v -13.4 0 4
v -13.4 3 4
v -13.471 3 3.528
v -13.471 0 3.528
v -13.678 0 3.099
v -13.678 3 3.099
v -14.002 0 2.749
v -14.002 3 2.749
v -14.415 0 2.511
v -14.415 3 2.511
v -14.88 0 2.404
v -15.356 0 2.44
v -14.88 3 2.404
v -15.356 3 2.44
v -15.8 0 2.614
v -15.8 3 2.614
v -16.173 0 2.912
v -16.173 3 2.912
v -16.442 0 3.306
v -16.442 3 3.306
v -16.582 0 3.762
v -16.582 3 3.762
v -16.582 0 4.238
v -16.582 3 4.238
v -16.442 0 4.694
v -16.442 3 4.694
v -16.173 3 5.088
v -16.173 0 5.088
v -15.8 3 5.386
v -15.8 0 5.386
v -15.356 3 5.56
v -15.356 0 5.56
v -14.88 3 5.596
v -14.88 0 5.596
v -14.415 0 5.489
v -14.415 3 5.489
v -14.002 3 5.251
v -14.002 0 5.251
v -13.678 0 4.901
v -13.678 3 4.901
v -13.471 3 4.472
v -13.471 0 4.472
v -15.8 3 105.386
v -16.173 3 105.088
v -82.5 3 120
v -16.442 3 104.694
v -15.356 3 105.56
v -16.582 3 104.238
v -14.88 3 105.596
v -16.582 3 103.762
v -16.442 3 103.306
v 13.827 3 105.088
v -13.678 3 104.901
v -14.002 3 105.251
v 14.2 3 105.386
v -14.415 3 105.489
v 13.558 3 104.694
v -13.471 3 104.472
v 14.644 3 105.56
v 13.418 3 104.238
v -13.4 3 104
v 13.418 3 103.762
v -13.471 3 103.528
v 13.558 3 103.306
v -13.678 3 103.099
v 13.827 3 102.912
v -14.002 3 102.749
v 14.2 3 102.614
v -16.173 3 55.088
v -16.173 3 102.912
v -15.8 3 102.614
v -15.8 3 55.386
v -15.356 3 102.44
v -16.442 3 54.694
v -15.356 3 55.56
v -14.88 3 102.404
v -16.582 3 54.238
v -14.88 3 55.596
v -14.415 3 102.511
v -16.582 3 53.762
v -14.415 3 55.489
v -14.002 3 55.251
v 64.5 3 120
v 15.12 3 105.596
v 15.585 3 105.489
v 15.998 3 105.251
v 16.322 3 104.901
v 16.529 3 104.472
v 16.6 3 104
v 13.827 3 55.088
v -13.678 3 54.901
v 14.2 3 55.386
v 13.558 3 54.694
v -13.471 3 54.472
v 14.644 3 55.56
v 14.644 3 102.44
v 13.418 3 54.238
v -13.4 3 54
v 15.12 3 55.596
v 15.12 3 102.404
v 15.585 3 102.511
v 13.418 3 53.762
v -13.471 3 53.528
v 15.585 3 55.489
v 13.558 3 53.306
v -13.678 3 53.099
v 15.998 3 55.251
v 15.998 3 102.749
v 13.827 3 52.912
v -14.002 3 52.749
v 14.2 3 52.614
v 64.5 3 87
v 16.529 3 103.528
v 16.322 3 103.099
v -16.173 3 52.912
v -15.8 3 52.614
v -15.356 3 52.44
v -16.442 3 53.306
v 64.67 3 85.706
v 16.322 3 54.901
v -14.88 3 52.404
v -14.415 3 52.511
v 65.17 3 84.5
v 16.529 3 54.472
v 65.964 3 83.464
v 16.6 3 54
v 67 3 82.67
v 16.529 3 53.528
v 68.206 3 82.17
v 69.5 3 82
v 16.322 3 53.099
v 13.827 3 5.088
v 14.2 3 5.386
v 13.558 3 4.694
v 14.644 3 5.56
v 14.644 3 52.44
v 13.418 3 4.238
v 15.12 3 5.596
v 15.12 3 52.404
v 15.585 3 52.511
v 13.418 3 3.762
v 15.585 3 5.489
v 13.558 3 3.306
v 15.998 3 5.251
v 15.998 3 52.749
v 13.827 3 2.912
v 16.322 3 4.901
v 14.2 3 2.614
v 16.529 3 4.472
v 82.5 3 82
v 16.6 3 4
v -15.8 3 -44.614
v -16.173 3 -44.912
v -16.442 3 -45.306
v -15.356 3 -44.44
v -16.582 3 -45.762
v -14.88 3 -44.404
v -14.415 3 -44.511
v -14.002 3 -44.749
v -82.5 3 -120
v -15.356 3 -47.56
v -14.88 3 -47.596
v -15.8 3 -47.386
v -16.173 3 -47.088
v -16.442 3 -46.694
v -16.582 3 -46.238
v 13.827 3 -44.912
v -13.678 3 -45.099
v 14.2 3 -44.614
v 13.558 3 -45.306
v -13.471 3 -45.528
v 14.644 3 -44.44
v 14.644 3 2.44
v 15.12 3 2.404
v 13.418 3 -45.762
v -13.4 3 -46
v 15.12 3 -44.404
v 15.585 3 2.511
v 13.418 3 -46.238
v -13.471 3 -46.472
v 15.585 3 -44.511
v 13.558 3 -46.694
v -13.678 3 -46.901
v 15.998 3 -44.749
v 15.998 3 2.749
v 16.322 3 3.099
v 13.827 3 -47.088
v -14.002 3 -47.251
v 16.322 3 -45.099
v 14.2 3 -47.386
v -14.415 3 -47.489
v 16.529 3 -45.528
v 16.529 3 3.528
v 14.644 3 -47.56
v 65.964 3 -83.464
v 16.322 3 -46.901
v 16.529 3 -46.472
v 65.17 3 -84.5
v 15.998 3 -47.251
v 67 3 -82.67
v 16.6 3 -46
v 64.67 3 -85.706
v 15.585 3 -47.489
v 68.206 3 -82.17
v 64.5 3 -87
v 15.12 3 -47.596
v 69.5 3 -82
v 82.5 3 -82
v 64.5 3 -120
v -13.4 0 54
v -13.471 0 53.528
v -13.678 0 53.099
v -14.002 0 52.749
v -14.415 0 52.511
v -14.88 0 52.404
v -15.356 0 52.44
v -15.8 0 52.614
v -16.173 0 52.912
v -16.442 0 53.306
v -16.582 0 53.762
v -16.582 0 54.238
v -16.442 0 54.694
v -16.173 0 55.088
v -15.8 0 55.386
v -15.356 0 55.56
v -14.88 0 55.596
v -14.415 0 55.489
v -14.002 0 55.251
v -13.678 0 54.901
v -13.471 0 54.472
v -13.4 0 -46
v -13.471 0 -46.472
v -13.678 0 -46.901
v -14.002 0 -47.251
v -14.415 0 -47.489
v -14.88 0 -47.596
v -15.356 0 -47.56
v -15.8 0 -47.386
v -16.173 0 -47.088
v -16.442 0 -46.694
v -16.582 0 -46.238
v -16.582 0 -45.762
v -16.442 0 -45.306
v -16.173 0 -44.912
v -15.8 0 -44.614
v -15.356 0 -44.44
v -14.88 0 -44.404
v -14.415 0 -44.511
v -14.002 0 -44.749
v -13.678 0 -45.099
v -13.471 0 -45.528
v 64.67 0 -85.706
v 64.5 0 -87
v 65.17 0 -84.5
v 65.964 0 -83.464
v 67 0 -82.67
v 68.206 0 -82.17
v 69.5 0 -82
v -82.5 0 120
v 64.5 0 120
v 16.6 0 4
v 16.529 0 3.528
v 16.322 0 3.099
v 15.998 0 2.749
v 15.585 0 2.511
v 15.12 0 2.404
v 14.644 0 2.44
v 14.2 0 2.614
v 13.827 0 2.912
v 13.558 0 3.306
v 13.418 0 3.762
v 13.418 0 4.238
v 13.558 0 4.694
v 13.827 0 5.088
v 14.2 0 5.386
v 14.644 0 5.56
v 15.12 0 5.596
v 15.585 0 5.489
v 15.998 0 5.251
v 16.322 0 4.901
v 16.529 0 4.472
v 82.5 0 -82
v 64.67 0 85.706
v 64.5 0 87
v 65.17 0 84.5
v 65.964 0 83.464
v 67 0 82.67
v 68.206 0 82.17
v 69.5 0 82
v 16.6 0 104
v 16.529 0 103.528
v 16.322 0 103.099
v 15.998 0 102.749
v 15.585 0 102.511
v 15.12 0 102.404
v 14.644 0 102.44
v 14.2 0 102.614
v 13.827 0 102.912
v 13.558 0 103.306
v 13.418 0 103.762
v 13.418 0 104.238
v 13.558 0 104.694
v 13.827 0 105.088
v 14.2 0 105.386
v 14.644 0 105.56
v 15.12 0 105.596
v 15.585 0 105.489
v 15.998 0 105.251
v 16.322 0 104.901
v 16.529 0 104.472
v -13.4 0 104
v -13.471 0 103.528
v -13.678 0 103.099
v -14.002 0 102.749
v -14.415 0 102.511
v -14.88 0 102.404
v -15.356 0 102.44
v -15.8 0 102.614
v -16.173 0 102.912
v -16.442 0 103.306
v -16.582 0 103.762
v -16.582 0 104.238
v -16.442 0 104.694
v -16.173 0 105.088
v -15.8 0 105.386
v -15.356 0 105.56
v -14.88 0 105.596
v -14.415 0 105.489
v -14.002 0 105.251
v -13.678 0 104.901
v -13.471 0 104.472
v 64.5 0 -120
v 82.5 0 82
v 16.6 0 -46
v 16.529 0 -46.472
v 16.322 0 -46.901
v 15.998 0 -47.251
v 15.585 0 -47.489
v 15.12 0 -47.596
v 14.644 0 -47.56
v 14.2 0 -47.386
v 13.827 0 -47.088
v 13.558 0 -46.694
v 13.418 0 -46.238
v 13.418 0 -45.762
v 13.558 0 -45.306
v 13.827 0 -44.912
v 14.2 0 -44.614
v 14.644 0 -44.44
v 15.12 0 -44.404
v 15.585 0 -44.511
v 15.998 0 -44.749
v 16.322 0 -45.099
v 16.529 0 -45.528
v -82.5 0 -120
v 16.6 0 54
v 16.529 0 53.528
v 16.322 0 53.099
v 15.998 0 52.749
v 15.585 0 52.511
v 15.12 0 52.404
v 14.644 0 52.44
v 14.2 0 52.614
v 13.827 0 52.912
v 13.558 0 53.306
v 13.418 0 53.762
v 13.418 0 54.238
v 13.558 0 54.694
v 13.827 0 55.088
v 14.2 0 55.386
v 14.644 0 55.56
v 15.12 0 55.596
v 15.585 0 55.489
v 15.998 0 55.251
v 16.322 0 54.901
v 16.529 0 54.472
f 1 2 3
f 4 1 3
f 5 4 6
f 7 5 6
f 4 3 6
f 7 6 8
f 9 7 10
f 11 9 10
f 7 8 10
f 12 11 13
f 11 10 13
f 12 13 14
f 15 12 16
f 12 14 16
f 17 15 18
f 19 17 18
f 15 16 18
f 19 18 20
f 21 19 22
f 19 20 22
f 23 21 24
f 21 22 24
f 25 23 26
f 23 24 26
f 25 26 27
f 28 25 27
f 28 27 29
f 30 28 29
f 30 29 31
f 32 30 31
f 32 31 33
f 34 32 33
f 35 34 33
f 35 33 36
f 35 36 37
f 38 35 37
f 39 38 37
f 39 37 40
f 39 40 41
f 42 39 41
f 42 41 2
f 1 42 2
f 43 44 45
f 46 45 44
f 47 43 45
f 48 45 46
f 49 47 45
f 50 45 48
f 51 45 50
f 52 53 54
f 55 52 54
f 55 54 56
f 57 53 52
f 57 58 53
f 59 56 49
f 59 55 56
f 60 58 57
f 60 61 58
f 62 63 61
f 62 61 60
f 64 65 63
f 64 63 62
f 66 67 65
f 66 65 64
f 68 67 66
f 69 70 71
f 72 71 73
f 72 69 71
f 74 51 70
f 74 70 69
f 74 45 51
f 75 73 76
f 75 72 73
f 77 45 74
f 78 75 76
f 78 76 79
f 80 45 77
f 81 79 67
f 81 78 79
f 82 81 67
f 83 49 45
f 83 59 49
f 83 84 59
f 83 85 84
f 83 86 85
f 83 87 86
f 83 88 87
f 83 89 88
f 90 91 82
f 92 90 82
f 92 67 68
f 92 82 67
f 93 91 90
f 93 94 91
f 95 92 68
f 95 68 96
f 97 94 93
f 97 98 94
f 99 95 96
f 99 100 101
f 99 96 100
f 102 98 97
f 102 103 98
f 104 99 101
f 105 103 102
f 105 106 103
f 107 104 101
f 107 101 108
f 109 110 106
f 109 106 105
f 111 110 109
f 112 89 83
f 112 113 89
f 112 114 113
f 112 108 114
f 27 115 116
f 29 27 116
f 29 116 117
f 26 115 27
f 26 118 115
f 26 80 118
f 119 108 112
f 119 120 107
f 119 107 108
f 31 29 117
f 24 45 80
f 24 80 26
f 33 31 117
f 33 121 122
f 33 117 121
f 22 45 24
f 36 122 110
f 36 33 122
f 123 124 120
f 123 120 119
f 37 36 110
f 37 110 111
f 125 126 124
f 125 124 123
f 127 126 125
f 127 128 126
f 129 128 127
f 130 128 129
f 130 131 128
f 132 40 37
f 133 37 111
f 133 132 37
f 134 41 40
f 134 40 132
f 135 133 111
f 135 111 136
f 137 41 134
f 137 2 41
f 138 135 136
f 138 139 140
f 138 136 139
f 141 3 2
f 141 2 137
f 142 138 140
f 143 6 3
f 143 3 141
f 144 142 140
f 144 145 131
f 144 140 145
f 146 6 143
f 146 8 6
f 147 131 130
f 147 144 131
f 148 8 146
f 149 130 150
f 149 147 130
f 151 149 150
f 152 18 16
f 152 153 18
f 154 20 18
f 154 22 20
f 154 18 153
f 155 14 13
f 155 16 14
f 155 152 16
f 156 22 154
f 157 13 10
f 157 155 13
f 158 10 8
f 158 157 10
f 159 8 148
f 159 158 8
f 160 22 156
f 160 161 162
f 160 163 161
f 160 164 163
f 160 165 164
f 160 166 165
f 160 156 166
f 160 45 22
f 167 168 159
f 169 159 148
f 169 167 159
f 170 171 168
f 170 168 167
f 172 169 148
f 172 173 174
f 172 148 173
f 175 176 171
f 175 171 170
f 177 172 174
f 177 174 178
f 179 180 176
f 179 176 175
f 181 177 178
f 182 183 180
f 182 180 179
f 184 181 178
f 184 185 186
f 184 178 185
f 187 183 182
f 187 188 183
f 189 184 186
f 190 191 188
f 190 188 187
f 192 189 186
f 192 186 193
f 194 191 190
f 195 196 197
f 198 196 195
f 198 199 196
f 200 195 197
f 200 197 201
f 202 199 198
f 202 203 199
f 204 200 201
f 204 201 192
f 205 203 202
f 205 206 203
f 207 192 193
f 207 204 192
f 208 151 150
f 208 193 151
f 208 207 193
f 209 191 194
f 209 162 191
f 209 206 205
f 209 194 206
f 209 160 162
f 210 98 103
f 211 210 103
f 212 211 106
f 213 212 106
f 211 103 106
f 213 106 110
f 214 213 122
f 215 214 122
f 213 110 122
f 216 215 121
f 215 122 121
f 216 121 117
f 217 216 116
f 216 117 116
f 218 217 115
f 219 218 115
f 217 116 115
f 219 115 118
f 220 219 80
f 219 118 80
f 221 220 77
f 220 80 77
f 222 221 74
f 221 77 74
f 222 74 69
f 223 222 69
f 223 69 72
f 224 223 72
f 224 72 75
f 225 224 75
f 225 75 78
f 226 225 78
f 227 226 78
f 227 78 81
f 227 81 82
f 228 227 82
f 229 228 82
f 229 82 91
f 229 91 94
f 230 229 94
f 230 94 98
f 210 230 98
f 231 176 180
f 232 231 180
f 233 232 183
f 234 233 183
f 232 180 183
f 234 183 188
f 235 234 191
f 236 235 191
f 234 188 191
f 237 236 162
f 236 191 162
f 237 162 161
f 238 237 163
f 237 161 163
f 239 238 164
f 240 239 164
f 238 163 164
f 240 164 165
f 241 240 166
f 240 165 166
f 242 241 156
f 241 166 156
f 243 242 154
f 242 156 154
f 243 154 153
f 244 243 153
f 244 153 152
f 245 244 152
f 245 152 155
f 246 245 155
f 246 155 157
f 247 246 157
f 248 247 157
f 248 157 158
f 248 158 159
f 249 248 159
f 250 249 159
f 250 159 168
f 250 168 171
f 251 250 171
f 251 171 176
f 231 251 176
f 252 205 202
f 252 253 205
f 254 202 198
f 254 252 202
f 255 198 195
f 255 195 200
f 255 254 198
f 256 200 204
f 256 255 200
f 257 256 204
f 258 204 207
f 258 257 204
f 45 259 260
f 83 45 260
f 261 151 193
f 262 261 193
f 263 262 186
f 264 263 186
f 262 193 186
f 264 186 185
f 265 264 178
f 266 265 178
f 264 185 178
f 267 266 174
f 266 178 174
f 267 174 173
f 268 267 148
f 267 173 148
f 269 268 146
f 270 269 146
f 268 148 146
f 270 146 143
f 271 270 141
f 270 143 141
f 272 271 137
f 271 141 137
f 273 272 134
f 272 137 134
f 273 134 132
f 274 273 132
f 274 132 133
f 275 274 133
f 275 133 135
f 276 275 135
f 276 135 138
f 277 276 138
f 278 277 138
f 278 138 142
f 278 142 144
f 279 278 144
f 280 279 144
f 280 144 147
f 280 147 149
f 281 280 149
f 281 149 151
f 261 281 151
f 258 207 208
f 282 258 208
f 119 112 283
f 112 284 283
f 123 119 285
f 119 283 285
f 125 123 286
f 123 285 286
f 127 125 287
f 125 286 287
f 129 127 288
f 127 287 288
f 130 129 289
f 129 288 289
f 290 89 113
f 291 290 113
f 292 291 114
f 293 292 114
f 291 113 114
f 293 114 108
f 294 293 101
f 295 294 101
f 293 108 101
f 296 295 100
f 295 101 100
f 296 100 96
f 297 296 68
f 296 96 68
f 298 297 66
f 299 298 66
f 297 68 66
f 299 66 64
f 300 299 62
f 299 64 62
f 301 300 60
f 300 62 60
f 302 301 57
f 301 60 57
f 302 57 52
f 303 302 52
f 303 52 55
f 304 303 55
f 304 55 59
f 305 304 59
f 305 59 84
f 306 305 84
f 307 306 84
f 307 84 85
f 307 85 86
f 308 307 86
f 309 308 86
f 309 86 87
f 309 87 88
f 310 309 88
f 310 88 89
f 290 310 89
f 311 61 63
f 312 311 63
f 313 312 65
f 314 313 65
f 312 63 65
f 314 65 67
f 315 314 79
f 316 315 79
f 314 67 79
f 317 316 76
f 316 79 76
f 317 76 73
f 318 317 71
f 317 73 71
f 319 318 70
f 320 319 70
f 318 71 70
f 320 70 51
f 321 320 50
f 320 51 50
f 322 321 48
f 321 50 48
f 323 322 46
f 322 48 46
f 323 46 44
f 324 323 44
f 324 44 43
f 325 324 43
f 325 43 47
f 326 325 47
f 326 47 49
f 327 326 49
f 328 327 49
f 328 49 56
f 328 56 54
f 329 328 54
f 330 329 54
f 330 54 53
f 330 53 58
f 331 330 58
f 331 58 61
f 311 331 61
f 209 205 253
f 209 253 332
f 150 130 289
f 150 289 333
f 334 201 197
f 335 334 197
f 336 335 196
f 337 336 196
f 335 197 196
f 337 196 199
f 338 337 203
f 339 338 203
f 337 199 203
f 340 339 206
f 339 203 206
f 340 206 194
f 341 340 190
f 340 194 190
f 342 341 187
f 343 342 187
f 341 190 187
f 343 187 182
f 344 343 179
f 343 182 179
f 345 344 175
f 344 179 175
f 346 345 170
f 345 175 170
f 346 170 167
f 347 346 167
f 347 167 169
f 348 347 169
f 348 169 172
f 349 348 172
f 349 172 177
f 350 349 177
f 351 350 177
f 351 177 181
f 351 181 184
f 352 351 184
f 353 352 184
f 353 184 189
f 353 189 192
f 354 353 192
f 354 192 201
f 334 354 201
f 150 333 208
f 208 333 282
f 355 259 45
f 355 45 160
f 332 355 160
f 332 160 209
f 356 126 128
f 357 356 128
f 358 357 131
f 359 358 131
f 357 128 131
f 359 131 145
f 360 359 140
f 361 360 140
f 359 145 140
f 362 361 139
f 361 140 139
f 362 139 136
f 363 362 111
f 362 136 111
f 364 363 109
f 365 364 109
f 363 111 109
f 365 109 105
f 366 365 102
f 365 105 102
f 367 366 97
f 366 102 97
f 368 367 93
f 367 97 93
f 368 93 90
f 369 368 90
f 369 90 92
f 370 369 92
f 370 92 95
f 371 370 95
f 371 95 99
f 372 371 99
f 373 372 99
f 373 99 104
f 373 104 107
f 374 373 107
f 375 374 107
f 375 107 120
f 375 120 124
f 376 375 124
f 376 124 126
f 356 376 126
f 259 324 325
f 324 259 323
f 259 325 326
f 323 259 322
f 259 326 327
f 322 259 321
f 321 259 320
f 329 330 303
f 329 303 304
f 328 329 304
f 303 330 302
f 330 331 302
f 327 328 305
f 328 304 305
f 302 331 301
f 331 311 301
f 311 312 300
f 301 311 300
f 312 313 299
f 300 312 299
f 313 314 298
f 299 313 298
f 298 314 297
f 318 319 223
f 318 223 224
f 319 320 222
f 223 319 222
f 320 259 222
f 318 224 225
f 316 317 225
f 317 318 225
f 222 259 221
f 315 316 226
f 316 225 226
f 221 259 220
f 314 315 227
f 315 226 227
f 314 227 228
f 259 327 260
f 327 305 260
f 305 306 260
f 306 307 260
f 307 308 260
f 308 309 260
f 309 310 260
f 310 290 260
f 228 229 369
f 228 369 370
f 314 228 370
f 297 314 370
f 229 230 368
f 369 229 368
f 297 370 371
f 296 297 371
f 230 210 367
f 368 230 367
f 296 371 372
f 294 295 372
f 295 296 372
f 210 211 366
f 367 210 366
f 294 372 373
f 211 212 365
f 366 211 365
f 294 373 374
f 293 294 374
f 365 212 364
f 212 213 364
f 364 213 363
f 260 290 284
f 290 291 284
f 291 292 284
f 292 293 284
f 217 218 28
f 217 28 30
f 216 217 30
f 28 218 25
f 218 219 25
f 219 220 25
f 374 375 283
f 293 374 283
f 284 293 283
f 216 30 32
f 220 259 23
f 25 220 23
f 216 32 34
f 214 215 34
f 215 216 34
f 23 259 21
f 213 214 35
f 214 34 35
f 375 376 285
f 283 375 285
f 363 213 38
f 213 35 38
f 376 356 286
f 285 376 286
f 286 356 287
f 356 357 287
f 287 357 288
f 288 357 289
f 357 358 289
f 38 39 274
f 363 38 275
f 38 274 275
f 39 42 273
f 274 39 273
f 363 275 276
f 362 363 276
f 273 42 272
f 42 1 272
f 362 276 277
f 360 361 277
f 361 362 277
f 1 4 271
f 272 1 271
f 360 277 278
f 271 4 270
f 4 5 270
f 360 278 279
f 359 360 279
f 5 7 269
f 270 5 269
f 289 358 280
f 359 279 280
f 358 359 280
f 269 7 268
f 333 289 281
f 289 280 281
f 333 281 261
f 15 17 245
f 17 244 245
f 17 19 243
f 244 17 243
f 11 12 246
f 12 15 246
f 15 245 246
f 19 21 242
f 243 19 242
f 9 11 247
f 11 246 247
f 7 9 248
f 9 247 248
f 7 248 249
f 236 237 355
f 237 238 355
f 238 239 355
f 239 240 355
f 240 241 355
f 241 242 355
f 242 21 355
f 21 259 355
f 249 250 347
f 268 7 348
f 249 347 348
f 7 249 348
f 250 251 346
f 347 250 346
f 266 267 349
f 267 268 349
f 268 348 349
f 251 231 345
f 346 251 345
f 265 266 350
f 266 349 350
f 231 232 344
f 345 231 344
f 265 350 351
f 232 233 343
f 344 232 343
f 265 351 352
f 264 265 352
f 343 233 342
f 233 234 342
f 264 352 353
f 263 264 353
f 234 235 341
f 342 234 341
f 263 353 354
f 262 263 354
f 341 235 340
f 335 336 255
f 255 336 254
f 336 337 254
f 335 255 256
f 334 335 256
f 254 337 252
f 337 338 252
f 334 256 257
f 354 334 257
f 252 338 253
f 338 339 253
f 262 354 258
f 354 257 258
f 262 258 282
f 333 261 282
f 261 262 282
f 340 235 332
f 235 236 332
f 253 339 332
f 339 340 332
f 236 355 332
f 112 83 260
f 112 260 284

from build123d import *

# Parameters (mm, degrees)
SKETCH1_W           = 165
SKETCH1_H           = 240
BOSS_EXTRUDE1_DEPTH = 3
SKETCH3_R           = 1.6
CUT_EXTRUDE2_DEPTH  = 11
SKETCH2_W           = 18
SKETCH2_H           = 38
CUT_EXTRUDE1_DEPTH  = 11
FILLET1_R           = 5


with BuildPart() as part:
    # Sketch1 → Boss-Extrude1 (new body)
    with BuildSketch(Plane(origin=(0, 0, 0), x_dir=(1, 0, 0), z_dir=(0, 1, 0))):
        Rectangle(SKETCH1_W, SKETCH1_H)
    extrude(amount=BOSS_EXTRUDE1_DEPTH)

    # Sketch3 → Cut-Extrude2 (cut)
    with BuildSketch(Plane(origin=(0, 3, 0), x_dir=(1, 0, 0), z_dir=(0, 1, 0))):
        with Locations((15, 46)):
            Circle(SKETCH3_R)
        with Locations((-15, 46)):
            Circle(SKETCH3_R)
        with Locations((15, -4)):
            Circle(SKETCH3_R)
        with Locations((-15, -4)):
            Circle(SKETCH3_R)
        with Locations((15, -54)):
            Circle(SKETCH3_R)
        with Locations((-15, -54)):
            Circle(SKETCH3_R)
        with Locations((15, -104)):
            Circle(SKETCH3_R)
        with Locations((-15, -104)):
            Circle(SKETCH3_R)
    extrude(amount=-CUT_EXTRUDE2_DEPTH, mode=Mode.SUBTRACT)

    # Sketch2 → Cut-Extrude1 (cut)
    with BuildSketch(Plane(origin=(0, 3, 0), x_dir=(1, 0, 0), z_dir=(0, 1, 0))):
        with Locations((73.5, 101)):
            Rectangle(SKETCH2_W, SKETCH2_H)
        with Locations((73.5, -101)):
            Rectangle(SKETCH2_W, SKETCH2_H)
    extrude(amount=-CUT_EXTRUDE1_DEPTH, mode=Mode.SUBTRACT)

    # Fillet1
    fillet1_edges = [part.edges().sort_by_distance(p)[0] for p in [
        (64.5, 1.5, -82),
        (64.5, 1.5, 82),
    ]]
    fillet(fillet1_edges, radius=FILLET1_R)


solid = part.part
